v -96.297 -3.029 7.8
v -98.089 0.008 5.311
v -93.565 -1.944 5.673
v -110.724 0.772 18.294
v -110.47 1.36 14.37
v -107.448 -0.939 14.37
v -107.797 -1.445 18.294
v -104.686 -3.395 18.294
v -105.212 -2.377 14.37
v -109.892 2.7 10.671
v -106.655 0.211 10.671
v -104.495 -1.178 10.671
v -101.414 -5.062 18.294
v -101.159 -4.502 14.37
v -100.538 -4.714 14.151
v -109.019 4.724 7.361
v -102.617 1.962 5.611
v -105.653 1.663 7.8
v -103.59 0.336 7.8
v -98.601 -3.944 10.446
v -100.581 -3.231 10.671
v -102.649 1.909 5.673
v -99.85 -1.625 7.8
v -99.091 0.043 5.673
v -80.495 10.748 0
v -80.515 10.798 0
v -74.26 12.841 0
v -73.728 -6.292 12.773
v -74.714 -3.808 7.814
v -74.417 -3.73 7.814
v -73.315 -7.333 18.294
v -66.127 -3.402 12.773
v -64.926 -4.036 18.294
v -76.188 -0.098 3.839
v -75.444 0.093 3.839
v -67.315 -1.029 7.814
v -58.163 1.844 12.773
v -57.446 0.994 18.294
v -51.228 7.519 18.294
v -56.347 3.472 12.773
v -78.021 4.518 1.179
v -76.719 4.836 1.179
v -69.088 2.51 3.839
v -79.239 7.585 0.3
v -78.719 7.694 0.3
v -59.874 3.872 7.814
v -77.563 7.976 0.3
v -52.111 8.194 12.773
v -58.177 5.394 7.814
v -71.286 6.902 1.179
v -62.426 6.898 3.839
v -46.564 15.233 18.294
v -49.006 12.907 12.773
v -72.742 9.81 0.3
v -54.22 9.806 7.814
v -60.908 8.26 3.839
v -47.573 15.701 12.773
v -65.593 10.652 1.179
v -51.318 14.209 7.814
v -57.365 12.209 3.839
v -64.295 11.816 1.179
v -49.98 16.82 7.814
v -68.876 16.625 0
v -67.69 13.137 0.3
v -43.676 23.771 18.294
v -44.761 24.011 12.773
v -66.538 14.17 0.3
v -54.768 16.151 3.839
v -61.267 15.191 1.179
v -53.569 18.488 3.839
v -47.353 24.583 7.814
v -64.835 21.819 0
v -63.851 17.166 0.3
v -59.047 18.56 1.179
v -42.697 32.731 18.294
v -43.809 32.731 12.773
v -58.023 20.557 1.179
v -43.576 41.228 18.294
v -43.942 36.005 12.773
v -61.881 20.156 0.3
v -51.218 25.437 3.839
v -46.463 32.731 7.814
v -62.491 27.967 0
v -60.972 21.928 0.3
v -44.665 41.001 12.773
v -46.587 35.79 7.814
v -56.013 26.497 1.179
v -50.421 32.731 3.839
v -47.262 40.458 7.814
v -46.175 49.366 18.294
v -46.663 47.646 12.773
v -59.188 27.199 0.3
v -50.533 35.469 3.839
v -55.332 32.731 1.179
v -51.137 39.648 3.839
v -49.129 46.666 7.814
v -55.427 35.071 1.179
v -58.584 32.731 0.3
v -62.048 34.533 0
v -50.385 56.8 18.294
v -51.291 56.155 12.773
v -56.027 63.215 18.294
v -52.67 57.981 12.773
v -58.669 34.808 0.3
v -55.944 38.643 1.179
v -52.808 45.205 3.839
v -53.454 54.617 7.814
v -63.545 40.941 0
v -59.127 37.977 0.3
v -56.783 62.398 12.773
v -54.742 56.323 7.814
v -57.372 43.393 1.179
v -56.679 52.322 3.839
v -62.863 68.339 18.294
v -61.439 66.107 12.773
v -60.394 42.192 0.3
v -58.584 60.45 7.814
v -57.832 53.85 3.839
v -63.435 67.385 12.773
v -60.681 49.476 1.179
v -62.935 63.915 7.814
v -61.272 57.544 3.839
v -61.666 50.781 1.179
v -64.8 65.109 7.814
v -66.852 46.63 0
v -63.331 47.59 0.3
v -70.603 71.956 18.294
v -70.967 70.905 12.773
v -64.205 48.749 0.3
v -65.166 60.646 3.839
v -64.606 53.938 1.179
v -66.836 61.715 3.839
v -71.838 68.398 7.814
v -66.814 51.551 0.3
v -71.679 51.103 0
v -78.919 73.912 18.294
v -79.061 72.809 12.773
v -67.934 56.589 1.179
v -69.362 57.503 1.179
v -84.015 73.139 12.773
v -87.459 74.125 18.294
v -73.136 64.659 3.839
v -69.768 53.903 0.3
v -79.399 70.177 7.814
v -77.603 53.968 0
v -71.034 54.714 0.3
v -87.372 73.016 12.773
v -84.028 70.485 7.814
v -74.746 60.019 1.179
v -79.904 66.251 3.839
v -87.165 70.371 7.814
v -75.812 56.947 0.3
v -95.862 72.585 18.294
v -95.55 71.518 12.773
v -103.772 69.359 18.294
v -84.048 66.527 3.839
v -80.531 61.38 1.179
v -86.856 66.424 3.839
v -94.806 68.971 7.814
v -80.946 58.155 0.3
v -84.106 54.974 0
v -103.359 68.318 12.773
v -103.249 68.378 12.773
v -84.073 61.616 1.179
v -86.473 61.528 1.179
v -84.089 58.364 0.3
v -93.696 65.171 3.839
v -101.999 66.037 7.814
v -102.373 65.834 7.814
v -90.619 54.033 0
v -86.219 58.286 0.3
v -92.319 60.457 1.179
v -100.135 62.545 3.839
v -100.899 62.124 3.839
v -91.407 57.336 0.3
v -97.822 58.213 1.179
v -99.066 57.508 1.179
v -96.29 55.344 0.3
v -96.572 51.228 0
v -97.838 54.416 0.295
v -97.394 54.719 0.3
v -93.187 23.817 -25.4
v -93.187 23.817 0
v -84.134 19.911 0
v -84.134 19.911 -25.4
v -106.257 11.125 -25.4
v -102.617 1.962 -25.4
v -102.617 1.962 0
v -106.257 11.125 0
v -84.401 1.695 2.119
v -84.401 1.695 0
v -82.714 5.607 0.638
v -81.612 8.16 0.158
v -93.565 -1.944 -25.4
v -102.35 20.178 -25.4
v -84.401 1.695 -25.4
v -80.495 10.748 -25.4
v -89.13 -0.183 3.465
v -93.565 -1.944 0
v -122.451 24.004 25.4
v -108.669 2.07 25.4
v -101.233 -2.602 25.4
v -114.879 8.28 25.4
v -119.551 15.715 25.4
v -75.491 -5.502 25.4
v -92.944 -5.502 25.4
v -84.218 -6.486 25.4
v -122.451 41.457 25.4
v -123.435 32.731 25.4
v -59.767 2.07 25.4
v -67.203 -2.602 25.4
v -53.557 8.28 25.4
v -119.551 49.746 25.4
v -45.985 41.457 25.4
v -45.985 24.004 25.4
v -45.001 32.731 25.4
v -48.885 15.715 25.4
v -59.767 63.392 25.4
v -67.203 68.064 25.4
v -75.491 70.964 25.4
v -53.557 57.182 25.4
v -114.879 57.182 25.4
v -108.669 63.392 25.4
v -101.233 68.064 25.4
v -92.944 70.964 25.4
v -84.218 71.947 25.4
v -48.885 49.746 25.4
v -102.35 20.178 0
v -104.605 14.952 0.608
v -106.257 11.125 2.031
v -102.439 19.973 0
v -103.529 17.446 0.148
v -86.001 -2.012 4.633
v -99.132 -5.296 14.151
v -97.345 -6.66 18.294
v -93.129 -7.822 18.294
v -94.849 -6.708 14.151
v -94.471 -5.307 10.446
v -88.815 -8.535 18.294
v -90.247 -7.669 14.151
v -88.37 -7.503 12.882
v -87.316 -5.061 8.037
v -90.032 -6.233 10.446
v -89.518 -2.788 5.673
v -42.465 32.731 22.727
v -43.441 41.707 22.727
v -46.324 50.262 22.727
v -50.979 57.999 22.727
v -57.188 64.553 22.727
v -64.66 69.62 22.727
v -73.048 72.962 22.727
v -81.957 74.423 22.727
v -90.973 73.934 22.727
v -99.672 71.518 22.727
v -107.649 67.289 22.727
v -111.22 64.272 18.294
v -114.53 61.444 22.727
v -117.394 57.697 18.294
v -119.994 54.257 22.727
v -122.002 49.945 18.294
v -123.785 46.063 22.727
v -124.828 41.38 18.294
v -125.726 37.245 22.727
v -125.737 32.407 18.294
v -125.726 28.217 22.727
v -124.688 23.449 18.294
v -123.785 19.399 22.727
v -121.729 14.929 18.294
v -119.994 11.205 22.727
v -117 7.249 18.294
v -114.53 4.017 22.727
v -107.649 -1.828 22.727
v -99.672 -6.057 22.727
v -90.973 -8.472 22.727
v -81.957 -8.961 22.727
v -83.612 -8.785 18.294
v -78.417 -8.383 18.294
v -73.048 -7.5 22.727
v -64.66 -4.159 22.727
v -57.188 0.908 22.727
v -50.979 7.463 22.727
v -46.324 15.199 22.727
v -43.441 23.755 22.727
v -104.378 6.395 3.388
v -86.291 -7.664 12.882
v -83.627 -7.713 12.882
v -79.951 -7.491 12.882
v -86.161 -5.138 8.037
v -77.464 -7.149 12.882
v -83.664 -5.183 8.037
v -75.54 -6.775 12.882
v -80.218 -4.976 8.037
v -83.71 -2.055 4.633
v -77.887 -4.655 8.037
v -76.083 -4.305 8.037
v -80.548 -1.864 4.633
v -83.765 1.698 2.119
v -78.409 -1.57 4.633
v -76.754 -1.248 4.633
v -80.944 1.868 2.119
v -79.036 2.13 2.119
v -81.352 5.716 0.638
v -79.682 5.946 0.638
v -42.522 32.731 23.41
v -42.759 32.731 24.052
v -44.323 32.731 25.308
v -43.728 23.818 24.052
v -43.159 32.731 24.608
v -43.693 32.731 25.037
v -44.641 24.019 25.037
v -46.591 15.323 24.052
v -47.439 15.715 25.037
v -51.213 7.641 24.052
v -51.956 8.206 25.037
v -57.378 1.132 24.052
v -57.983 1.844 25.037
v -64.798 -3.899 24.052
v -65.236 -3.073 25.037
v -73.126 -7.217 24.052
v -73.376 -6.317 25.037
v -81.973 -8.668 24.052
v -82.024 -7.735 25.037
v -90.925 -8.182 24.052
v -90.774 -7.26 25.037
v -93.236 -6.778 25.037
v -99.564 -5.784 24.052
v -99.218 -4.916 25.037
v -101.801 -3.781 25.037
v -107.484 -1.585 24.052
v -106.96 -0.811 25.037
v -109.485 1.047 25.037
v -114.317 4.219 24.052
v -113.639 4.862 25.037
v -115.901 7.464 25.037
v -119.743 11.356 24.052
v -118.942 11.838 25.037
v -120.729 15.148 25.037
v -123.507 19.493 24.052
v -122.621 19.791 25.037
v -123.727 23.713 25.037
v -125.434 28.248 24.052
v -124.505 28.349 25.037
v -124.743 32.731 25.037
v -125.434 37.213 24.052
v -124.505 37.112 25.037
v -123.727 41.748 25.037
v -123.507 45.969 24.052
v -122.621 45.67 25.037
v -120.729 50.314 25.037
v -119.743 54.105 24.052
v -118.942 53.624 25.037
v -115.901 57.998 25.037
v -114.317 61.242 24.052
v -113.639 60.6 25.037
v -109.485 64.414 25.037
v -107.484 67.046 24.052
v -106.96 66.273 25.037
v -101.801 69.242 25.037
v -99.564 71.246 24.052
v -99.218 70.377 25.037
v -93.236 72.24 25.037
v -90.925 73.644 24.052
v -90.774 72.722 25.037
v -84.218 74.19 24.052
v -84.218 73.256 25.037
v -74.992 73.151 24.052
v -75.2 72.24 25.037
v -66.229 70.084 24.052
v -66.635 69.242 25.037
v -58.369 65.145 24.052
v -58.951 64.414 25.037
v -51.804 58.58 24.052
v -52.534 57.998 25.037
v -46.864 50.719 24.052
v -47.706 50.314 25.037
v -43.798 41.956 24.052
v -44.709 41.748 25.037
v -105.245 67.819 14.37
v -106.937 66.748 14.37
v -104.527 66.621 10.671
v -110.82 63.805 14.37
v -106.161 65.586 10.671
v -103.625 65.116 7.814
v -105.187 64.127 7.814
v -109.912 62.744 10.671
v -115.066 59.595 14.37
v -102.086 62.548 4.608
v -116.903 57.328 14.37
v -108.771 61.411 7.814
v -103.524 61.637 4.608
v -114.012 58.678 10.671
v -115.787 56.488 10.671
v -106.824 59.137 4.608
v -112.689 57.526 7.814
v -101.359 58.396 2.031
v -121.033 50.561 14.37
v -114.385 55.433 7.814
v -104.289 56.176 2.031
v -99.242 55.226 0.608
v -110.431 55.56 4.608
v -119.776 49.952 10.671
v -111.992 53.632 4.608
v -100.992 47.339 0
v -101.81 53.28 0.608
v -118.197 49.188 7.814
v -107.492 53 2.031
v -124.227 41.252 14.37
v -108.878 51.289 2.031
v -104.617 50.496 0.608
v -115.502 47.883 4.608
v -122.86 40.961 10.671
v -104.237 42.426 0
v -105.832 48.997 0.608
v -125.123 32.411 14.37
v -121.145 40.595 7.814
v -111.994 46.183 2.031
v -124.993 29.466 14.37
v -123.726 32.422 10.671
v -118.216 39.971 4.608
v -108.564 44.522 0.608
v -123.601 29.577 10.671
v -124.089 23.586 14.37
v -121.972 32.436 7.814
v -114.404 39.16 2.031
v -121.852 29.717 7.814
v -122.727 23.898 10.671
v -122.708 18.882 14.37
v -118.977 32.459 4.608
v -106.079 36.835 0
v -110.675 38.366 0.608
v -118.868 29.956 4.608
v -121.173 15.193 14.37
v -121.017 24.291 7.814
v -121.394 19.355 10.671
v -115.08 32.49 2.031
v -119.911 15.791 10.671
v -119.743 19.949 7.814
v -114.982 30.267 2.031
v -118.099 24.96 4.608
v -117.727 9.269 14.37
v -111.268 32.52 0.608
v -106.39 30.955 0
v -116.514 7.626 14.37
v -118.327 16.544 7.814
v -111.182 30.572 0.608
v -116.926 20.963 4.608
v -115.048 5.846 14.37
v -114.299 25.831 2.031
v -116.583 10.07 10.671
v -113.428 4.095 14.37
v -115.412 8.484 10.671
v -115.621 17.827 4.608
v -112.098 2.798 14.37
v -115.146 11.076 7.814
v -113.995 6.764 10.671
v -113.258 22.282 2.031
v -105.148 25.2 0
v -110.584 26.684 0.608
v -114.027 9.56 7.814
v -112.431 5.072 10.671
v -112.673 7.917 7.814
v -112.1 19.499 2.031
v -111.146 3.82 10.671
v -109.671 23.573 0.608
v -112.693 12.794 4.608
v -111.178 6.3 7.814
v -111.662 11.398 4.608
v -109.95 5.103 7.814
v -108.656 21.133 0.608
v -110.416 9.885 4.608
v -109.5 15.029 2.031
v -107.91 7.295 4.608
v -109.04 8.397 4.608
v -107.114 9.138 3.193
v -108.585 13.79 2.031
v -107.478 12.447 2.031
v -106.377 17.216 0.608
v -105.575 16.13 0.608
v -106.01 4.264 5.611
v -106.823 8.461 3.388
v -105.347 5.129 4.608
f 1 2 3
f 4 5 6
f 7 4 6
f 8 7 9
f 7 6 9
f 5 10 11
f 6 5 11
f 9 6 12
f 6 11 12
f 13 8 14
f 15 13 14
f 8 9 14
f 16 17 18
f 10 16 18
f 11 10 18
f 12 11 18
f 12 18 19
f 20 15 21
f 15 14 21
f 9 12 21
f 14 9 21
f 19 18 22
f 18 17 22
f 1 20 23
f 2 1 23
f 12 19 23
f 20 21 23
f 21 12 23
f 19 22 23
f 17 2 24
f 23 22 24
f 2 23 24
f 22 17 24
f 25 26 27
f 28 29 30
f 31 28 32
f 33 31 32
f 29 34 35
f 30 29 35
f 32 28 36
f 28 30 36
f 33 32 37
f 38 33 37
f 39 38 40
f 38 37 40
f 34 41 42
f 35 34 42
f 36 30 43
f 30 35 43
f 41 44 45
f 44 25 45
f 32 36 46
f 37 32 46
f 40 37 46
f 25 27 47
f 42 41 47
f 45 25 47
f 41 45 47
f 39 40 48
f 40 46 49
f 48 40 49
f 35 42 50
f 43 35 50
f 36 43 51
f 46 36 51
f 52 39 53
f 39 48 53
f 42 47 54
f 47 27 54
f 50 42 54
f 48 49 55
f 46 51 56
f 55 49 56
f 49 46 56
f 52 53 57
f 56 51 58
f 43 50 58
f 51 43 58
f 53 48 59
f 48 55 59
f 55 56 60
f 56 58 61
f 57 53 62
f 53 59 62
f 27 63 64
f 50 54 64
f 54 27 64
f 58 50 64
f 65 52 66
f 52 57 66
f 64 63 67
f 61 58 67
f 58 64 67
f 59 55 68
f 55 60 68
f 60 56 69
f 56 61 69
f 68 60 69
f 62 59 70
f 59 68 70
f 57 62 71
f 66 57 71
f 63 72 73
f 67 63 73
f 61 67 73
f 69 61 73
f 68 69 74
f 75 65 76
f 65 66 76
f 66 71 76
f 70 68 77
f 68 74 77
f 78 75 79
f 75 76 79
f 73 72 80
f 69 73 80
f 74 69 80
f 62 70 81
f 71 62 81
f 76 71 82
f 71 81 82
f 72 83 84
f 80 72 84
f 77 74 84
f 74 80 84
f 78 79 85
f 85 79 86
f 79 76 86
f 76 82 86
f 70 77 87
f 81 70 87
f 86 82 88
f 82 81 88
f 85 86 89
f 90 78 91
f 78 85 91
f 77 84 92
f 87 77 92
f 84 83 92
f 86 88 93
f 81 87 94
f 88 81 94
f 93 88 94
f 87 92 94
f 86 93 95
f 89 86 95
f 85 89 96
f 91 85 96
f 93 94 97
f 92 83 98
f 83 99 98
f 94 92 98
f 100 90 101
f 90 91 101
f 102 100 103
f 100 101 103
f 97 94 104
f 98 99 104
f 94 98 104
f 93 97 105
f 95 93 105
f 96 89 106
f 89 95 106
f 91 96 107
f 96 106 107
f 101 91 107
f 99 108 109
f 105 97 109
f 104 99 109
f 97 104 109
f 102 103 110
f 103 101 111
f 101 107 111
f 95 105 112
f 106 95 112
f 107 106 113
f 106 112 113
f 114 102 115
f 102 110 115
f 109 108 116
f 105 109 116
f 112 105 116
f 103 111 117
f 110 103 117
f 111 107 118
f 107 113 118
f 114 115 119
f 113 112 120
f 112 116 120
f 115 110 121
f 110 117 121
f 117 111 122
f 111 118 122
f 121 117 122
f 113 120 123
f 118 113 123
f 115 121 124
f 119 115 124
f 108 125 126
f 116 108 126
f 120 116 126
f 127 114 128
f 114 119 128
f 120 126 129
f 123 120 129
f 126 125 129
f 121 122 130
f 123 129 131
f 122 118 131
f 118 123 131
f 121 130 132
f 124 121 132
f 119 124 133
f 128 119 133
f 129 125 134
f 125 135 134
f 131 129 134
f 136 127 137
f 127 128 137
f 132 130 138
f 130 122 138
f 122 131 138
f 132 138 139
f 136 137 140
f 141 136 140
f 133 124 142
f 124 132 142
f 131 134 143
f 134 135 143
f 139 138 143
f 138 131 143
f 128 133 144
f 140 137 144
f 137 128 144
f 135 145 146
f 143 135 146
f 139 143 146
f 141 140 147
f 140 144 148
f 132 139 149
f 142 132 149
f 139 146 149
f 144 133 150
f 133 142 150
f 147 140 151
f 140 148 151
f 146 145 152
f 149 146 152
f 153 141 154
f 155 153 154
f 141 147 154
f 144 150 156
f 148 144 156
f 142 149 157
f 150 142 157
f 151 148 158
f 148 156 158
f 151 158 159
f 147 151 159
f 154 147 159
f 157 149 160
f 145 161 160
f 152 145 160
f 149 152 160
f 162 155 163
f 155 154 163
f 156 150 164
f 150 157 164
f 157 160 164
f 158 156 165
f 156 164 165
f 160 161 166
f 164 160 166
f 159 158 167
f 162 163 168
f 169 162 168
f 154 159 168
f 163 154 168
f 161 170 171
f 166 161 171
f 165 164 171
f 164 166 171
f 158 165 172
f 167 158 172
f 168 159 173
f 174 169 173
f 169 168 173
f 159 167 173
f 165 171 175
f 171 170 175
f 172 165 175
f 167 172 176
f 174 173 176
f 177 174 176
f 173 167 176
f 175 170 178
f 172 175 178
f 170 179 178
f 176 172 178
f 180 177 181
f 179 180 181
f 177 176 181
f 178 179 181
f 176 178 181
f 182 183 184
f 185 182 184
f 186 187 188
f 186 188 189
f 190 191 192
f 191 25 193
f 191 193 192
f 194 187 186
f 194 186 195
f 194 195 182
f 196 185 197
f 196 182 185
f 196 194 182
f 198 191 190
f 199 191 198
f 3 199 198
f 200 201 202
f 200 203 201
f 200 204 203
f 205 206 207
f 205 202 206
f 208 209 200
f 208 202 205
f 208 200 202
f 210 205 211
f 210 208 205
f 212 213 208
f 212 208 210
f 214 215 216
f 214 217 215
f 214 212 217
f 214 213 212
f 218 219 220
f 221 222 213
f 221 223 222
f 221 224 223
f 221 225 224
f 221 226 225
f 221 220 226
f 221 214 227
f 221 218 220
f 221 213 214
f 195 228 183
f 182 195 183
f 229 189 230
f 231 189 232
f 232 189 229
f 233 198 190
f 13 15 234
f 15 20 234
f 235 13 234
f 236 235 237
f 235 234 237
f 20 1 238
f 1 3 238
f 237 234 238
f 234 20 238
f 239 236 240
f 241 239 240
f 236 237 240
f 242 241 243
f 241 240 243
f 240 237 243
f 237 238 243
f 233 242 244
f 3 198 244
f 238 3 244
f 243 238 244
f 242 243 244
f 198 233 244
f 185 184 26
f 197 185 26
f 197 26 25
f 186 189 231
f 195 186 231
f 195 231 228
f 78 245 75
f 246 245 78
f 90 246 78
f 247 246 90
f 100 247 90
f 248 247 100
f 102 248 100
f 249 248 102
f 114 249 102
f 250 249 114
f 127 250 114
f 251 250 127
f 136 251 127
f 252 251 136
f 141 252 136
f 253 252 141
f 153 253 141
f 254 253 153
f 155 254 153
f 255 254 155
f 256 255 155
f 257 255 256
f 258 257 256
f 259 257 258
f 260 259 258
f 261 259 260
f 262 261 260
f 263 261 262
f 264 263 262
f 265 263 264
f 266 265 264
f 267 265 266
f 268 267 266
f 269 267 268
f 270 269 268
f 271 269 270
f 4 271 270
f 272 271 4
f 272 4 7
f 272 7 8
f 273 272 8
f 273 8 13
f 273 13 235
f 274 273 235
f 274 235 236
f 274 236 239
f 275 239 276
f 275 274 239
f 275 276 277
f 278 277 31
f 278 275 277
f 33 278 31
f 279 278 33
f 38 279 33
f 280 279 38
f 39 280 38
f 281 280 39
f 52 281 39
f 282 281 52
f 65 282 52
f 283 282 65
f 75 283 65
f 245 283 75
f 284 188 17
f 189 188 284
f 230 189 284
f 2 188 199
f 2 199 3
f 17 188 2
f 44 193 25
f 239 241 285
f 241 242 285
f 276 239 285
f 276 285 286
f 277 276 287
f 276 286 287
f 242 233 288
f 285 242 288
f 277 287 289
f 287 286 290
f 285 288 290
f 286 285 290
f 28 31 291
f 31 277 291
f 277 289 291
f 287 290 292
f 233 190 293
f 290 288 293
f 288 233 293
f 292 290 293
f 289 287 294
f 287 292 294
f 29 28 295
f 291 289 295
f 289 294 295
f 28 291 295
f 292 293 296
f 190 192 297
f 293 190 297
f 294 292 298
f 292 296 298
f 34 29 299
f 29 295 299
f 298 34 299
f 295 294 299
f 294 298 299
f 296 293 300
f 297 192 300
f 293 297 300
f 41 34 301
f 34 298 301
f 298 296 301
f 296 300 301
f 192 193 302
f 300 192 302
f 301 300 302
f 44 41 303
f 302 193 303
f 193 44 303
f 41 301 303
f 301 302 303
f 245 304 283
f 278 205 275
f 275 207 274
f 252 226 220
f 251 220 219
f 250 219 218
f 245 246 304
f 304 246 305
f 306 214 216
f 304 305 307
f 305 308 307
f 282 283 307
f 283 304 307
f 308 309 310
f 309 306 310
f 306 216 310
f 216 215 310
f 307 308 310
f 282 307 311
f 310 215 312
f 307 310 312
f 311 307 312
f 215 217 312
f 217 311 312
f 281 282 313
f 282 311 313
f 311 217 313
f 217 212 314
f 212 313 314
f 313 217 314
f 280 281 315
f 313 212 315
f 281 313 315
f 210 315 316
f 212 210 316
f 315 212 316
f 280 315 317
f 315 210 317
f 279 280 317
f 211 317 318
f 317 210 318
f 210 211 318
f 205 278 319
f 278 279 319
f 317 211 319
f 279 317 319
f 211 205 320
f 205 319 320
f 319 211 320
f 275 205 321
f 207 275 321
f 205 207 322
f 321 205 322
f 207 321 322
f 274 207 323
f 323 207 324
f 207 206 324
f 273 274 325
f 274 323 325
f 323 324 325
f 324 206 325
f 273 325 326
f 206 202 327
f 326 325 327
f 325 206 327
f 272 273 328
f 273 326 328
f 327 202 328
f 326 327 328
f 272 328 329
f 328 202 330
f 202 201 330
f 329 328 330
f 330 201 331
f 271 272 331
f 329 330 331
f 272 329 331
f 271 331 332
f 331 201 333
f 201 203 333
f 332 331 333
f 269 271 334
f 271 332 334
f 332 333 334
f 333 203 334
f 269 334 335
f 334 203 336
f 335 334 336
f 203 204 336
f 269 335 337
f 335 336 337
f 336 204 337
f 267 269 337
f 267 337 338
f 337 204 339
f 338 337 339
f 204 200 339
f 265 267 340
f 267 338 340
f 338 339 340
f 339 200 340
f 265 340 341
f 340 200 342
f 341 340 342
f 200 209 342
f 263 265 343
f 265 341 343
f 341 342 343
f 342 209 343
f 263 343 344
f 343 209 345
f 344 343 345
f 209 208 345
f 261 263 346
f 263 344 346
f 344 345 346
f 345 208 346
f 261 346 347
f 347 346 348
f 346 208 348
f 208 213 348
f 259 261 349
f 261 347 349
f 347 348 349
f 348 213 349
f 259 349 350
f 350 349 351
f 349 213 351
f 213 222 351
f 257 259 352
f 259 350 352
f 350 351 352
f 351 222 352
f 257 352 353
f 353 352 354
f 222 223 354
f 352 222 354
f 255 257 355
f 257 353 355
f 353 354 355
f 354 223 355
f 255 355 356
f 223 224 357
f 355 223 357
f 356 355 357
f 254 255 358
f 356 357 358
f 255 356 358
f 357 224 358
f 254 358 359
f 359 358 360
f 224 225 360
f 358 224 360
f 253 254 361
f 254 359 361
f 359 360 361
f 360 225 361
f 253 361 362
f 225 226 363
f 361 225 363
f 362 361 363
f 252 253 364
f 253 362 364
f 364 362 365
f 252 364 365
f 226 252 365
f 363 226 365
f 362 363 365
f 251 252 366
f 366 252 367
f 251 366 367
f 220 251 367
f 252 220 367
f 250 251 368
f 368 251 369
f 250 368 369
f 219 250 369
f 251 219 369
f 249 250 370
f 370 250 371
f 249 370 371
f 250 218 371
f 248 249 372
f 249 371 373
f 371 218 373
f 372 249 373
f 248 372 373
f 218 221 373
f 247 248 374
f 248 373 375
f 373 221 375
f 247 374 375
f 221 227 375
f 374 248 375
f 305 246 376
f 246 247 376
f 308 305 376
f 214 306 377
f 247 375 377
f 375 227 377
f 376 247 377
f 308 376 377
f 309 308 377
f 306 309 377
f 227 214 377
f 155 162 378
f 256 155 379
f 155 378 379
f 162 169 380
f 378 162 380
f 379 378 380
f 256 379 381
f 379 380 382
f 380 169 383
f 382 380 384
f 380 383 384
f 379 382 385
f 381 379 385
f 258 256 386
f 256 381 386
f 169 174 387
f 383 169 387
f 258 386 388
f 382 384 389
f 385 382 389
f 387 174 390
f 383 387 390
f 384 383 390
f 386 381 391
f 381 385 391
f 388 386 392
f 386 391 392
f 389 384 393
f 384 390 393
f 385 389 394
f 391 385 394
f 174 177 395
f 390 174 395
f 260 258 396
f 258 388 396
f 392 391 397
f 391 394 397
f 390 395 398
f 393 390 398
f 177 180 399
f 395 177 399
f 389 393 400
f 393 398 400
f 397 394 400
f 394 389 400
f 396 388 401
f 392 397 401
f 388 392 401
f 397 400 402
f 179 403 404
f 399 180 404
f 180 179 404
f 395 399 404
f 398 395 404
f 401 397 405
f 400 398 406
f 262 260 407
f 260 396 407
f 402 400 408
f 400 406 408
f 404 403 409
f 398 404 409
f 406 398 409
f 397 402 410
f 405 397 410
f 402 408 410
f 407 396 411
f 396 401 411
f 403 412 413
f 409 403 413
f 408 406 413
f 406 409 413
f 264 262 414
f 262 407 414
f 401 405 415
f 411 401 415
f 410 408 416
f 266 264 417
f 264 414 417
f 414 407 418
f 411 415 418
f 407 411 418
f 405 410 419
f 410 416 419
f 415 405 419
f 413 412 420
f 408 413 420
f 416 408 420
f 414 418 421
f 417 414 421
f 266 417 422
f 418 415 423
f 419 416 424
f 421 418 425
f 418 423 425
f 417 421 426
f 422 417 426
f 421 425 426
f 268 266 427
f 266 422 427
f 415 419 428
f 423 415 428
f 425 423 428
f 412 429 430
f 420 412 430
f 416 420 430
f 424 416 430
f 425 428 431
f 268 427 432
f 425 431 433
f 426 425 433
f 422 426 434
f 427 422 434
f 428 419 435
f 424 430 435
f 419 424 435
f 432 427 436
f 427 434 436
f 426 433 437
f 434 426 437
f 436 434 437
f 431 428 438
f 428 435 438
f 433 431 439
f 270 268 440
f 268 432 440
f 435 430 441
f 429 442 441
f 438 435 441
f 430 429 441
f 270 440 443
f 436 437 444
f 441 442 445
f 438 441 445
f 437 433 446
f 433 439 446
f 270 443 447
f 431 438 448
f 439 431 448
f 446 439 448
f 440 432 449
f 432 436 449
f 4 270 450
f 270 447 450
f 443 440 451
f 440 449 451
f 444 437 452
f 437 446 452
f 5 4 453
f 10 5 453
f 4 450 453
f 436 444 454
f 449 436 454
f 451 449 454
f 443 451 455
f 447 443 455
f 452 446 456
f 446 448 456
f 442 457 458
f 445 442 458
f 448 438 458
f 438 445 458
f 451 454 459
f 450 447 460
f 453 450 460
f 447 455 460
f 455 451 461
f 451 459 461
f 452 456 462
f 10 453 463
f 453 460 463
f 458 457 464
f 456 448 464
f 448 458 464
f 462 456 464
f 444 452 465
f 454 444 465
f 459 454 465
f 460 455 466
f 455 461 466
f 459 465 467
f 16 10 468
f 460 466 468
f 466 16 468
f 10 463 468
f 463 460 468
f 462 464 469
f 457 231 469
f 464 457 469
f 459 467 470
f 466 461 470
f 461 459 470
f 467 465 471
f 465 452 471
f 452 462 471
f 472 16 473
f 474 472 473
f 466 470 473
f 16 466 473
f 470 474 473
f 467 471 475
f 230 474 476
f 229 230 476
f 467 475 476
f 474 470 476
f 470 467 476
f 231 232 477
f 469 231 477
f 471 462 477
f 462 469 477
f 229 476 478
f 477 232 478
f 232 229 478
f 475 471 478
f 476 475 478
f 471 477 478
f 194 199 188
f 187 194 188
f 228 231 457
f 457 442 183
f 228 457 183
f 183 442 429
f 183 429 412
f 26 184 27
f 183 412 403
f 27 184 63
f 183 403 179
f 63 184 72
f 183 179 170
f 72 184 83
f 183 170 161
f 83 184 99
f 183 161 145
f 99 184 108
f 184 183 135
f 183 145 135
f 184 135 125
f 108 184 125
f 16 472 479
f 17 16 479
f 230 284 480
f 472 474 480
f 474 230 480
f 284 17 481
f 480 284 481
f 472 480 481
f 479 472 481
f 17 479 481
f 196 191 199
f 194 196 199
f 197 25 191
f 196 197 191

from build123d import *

# Parameters (mm, degrees)
F0_R     = 40.5620134448
F1_DEPTH = 25.4
F1_TAPER = -3
F2_R     = 2.54
F4_DEPTH = 25.4


# Not quite as in the source:
# - a fillet or chamfer that OpenCascade refuses, or shapes differently, is made with other operations: its cross-section is extruded or revolved along the edge and cut away or added


with BuildPart() as f1:
    # F0 (on Top) → F1 (new body)
    with BuildSketch(Plane.XY):
        with Locations((-84.2179358006, 32.7308289707)):
            Circle(F0_R)
    extrude(amount=F1_DEPTH, taper=F1_TAPER)

    # F2
    f2_edges = [f1.edges().sort_by_distance(p)[0] for p in [
        (-126.111107, 32.730829, 25.4),
    ]]
    fillet(f2_edges, radius=F2_R)

    # F3 (on face) → F4 (join)
    with BuildSketch(Plane(origin=(0, 0, 0), x_dir=(1, 0, 0), z_dir=(0, 0, -1))):
        Polygon((-84.1343444512, -19.9111274666), (-80.4951596333, -10.7477918976), (-84.4013240897, -1.6950429158), (-93.5646596587, 1.9441419021), (-102.6174086406, -1.9620225542), (-106.2565934585, -11.1253581232), (-102.3504290021, -20.1781071051), (-93.1870934331, -23.817291923), align=None)
    extrude(amount=F4_DEPTH)

    # F5: fillet of radius 19.304 on 1 edges, made by hand


with BuildPart() as f5_tool1:
    # F5_s2 → F5_t3 (revolve)
    with BuildSketch(Plane.XZ.offset(-32.7308289707)):
        with BuildLine():
            ThreePointArc((-42.6971898128, 18.2937067007), (-48.6867376225, 5.301373142), (-61.9747343517, 0))
            Line((-61.9747343517, 0), (-43.6559223558, 0))
            Line((-43.6559223558, 0), (-42.6971898128, 18.2937067007))
        make_face()
    revolve(axis=Axis((-84.2179358006, 32.7308289707, 0), (0, 0, 1)))

    split(bisect_by=Plane(origin=(-65.841803323, -26.1488285825, 0), x_dir=(0, 0, 1), z_dir=(0.929388426, 0.3691031748, 0)), keep=Keep.TOP)


with BuildPart() as f5_tool5:
    # F5_s6 → F5_t7 (revolve)
    with BuildSketch(Plane.XZ.offset(-32.7308289707)):
        with BuildLine():
            ThreePointArc((-42.6971898128, 18.2937067007), (-48.6867376225, 5.301373142), (-61.9747343517, 0))
            Line((-61.9747343517, 0), (-43.6559223558, 0))
            Line((-43.6559223558, 0), (-42.6971898128, 18.2937067007))
        make_face()
    revolve(axis=Axis((-84.2179358006, 32.7308289707, 0), (0, 0, 1)))

    split(bisect_by=Plane(origin=(-71.7703043479, 30.9681194552, 0), x_dir=(0, 0, 1), z_dir=(0.9181722162, -0.3961815006, 0)), keep=Keep.TOP)


with BuildPart() as f5_tool9:
    # F5_s10 → F5_t11 (revolve)
    with BuildSketch(Plane.XZ.offset(-32.7308289707)):
        with BuildLine():
            ThreePointArc((-42.6971898128, 18.2937067007), (-48.6867376225, 5.301373142), (-61.9747343517, 0))
            Line((-61.9747343517, 0), (-43.6559223558, 0))
            Line((-43.6559223558, 0), (-42.6971898128, 18.2937067007))
        make_face()
    revolve(axis=Axis((-84.2179358006, 32.7308289707, 0), (0, 0, 1)))

    split(bisect_by=Plane(origin=(-93.6255737167, 40.3984346626, 0), x_dir=(0, 0, 1), z_dir=(-0.9181722162, 0.3961815006, 0)), keep=Keep.TOP)


with BuildPart() as f5_tool13:
    # F5_s14 → F5_t15 (revolve)
    with BuildSketch(Plane.XZ.offset(-32.7308289707)):
        with BuildLine():
            ThreePointArc((-42.6971898128, 18.2937067007), (-48.6867376225, 5.301373142), (-61.9747343517, 0))
            Line((-61.9747343517, 0), (-43.6559223558, 0))
            Line((-43.6559223558, 0), (-42.6971898128, 18.2937067007))
        make_face()
    revolve(axis=Axis((-84.2179358006, 32.7308289707, 0), (0, 0, 1)))

    split(bisect_by=Plane(origin=(-12.0800640476, 30.4171637609, 0), x_dir=(0, 0, 1), z_dir=(0.3691031748, -0.929388426, 0)), keep=Keep.TOP)


with BuildPart() as f5_tool17:
    # F5_s18 → F5_t19 (revolve)
    with BuildSketch(Plane.XZ.offset(-32.7308289707)):
        with BuildLine():
            ThreePointArc((-42.6971898128, 18.2937067007), (-48.6867376225, 5.301373142), (-61.9747343517, 0))
            Line((-61.9747343517, 0), (-43.6559223558, 0))
            Line((-43.6559223558, 0), (-42.6971898128, 18.2937067007))
        make_face()
    revolve(axis=Axis((-84.2179358006, 32.7308289707, 0), (0, 0, 1)))

    split(bisect_by=Plane(origin=(-15.3930951173, -35.6743367329, 0), x_dir=(0, 0, 1), z_dir=(-0.3961815006, -0.9181722162, 0)), keep=Keep.TOP)


with BuildPart() as f5_tool21:
    # F5_s22 → F5_t23 (revolve)
    with BuildSketch(Plane.XZ.offset(-32.7308289707)):
        with BuildLine():
            ThreePointArc((-42.6971898128, 18.2937067007), (-48.6867376225, 5.301373142), (-61.9747343517, 0))
            Line((-61.9747343517, 0), (-43.6559223558, 0))
            Line((-43.6559223558, 0), (-42.6971898128, 18.2937067007))
        make_face()
    revolve(axis=Axis((-84.2179358006, 32.7308289707, 0), (0, 0, 1)))

    split(bisect_by=Plane(origin=(-87.9640523303, -34.9345979258, 0), x_dir=(0, 0, 1), z_dir=(-0.929388426, -0.3691031748, 0)), keep=Keep.TOP)


with BuildPart() as f1_1:
    add(f1.part)

    # F5_t25: cut F5_tool1, F5_tool5, F5_tool9, F5_tool13, F5_tool17, F5_tool21
    add([f5_tool1.part, f5_tool5.part, f5_tool9.part, f5_tool13.part, f5_tool17.part, f5_tool21.part], mode=Mode.SUBTRACT)


solid = f1_1.part
